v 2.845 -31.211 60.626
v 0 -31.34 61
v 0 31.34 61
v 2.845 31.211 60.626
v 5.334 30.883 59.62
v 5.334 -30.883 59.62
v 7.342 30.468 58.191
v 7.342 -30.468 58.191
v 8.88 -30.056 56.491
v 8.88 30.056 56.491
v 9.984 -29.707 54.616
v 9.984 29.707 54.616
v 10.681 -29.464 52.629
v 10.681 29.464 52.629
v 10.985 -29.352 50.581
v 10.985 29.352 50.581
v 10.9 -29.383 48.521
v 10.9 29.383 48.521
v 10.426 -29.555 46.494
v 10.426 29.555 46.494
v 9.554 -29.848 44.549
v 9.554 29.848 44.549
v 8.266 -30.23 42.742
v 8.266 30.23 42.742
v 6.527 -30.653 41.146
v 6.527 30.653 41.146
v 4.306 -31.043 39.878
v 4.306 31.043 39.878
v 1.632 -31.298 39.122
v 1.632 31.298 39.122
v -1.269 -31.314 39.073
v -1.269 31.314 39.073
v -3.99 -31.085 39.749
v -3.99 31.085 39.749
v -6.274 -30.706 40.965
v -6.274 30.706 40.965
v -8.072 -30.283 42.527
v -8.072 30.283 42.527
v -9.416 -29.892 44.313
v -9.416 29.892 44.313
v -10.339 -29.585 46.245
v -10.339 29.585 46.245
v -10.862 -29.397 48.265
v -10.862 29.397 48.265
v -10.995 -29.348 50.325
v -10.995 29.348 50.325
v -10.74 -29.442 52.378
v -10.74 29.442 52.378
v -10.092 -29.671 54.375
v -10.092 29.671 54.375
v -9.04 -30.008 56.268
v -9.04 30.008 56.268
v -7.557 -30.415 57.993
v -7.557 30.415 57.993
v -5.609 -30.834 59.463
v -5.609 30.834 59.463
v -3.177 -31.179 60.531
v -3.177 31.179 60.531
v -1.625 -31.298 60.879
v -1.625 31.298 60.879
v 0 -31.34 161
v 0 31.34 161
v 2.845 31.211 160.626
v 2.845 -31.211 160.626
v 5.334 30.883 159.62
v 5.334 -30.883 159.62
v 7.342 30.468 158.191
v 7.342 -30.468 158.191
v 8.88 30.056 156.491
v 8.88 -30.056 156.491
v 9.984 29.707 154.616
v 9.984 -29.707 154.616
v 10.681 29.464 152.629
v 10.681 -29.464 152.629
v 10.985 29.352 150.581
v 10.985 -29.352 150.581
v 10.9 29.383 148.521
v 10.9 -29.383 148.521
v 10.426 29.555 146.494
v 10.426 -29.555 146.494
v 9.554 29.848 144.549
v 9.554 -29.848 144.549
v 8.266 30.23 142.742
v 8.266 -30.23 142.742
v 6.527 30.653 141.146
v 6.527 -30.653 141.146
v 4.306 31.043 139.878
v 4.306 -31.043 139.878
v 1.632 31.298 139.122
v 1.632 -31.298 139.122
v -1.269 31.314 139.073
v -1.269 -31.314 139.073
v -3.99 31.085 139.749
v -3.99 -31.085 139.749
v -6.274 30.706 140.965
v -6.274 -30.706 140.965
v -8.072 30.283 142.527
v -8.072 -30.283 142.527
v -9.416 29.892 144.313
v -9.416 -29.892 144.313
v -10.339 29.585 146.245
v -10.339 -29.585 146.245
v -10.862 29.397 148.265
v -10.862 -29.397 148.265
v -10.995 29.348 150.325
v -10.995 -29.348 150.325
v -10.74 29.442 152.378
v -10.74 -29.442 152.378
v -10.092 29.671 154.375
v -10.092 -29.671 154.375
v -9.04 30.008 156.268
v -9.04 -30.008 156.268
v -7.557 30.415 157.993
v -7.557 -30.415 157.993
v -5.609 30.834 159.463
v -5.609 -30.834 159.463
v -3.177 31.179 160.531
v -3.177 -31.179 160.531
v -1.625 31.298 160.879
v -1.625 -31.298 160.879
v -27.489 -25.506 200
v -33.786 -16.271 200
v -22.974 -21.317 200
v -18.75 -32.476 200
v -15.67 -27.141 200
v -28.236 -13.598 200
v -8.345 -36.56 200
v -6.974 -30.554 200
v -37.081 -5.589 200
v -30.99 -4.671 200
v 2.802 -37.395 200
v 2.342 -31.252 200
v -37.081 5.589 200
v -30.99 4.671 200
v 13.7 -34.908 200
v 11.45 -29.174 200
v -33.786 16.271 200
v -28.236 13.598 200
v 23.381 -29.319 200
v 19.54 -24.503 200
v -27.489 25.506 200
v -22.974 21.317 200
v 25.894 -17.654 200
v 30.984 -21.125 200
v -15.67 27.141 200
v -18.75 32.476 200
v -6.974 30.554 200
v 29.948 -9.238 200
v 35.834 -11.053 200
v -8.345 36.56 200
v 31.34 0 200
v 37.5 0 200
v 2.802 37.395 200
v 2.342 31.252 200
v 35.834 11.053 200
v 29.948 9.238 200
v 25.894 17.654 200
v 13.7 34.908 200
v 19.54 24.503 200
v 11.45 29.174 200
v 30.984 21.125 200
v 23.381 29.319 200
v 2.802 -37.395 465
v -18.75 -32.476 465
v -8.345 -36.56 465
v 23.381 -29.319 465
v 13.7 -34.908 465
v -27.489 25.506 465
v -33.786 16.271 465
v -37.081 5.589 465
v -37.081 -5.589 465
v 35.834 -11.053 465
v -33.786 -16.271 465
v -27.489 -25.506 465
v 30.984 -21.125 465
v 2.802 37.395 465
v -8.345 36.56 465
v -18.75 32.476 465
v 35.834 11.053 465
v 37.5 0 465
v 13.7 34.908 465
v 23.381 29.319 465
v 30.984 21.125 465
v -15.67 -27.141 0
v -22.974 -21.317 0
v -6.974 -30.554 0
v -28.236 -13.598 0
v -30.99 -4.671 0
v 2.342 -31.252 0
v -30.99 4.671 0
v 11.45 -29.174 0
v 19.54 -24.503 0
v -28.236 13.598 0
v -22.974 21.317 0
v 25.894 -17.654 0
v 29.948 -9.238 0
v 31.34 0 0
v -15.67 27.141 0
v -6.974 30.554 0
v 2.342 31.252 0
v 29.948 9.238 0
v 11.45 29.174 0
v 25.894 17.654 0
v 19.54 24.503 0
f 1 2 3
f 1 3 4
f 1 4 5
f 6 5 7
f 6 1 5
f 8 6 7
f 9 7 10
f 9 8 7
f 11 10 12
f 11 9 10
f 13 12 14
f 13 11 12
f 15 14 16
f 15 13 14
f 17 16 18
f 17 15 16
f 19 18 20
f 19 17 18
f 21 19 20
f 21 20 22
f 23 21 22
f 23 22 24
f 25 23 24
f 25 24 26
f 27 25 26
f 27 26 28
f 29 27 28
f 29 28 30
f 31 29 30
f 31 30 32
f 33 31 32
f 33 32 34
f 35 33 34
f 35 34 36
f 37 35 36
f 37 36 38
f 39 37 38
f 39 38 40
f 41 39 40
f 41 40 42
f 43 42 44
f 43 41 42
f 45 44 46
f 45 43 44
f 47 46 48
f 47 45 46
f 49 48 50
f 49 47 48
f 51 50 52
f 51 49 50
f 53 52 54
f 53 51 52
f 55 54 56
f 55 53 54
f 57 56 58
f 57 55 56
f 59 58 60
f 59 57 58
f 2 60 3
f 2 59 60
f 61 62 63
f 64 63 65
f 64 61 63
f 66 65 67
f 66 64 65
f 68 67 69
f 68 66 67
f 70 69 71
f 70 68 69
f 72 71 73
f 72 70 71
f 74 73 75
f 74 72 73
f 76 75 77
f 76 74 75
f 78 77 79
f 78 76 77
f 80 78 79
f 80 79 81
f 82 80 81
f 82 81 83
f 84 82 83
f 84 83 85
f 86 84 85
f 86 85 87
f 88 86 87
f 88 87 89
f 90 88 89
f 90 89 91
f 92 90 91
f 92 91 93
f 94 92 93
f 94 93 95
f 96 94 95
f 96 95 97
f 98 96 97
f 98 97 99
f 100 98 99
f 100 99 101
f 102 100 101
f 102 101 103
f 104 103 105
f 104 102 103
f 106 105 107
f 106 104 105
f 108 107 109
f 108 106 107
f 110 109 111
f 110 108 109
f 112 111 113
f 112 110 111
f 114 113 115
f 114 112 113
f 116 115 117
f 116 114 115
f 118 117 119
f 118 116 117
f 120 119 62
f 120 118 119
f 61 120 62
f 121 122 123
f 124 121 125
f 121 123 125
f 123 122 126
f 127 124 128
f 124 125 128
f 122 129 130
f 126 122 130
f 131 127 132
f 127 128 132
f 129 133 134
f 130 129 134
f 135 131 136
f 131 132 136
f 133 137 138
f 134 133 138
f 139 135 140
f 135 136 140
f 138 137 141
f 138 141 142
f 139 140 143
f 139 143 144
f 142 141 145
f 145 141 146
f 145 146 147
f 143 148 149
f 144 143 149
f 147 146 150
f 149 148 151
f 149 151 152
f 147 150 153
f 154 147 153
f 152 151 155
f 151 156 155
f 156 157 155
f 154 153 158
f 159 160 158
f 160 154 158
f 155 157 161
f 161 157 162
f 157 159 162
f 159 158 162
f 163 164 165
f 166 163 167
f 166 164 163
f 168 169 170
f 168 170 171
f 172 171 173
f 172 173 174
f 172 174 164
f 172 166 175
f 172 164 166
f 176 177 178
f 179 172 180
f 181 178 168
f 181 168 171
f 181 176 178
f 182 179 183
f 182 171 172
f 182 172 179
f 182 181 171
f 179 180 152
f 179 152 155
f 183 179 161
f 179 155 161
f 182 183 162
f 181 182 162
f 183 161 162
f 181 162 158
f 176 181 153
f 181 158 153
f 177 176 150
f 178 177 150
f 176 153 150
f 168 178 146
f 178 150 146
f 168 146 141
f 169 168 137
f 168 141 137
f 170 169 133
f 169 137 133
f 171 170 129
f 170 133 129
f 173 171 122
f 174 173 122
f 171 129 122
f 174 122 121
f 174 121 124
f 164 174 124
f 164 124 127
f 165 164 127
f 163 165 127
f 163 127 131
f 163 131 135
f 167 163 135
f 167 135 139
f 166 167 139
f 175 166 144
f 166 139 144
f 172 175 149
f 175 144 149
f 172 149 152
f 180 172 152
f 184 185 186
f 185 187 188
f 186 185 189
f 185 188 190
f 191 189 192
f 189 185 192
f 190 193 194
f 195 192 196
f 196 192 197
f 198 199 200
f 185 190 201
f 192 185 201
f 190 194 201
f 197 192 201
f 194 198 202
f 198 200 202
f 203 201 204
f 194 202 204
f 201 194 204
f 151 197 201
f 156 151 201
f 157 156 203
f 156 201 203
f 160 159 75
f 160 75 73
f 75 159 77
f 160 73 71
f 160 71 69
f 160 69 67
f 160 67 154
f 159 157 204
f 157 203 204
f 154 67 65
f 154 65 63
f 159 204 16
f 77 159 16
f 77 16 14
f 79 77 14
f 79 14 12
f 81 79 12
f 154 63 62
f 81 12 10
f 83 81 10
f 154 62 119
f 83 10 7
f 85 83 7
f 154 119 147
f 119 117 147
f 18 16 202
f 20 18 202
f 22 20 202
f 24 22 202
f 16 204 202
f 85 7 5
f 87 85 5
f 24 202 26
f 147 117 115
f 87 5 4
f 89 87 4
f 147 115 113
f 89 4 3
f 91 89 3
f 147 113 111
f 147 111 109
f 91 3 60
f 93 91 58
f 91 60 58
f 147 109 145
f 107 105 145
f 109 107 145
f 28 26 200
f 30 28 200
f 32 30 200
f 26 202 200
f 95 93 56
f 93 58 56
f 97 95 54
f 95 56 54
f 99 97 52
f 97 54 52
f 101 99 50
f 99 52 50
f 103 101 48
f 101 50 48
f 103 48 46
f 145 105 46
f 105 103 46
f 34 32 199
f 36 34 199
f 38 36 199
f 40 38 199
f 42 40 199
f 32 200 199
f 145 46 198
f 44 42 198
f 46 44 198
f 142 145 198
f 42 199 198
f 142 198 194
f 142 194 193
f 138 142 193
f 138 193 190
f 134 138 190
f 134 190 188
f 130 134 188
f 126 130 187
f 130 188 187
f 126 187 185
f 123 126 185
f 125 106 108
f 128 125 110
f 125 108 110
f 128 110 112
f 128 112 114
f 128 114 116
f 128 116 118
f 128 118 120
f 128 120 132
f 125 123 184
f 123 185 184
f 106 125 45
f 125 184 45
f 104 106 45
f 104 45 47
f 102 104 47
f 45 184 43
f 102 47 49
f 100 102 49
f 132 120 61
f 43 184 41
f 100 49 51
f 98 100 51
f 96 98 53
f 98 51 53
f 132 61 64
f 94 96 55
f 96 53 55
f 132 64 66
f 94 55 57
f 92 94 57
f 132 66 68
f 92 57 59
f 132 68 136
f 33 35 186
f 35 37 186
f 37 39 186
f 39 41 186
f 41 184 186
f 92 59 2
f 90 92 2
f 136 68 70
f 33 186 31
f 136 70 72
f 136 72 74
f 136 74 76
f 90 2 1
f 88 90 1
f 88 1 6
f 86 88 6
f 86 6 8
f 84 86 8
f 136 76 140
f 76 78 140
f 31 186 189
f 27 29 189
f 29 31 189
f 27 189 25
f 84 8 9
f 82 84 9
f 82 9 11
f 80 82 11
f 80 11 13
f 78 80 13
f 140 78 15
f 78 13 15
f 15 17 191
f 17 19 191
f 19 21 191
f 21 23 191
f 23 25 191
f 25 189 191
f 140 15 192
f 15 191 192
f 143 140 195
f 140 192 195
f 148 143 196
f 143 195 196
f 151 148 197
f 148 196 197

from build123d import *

# Parameters (mm, degrees)
SKETCH1_R               = 31.34
BOSS_EXTRUDE1_DEPTH     = 200
SKETCH2_R               = 37.5
BOSS_EXTRUDE2_DEPTH     = 265
CUT_EXTRUDE1_DEPTH      = 469.014422855
CUT_EXTRUDE1_DEPTH_BACK = 469.014422855
SKETCH3_R               = 11


with BuildPart() as part:
    # Sketch1 → Boss-Extrude1 (new body)
    with BuildSketch(Plane.XY):
        Circle(SKETCH1_R)
    extrude(amount=BOSS_EXTRUDE1_DEPTH)

    # Sketch2 → Boss-Extrude2 (add)
    with BuildSketch(Plane.XY.offset(200)):
        Circle(SKETCH2_R)
    extrude(amount=BOSS_EXTRUDE2_DEPTH)

    # Sketch3 → Cut-Extrude1 (cut, two sides: drawn at the far end of the back side and taken through both)
    with BuildSketch(Plane(origin=(0, 0, 0), x_dir=(1, 0, 0), z_dir=(0, 1, 0)).offset(-CUT_EXTRUDE1_DEPTH_BACK)):
        with Locations(Location((0, -150, 0), (0, 0, 270))):
            Circle(SKETCH3_R)
        with Locations(Location((0, -50, 0), (0, 0, 270))):
            Circle(SKETCH3_R)
    extrude(amount=CUT_EXTRUDE1_DEPTH + CUT_EXTRUDE1_DEPTH_BACK, mode=Mode.SUBTRACT)


solid = part.part
